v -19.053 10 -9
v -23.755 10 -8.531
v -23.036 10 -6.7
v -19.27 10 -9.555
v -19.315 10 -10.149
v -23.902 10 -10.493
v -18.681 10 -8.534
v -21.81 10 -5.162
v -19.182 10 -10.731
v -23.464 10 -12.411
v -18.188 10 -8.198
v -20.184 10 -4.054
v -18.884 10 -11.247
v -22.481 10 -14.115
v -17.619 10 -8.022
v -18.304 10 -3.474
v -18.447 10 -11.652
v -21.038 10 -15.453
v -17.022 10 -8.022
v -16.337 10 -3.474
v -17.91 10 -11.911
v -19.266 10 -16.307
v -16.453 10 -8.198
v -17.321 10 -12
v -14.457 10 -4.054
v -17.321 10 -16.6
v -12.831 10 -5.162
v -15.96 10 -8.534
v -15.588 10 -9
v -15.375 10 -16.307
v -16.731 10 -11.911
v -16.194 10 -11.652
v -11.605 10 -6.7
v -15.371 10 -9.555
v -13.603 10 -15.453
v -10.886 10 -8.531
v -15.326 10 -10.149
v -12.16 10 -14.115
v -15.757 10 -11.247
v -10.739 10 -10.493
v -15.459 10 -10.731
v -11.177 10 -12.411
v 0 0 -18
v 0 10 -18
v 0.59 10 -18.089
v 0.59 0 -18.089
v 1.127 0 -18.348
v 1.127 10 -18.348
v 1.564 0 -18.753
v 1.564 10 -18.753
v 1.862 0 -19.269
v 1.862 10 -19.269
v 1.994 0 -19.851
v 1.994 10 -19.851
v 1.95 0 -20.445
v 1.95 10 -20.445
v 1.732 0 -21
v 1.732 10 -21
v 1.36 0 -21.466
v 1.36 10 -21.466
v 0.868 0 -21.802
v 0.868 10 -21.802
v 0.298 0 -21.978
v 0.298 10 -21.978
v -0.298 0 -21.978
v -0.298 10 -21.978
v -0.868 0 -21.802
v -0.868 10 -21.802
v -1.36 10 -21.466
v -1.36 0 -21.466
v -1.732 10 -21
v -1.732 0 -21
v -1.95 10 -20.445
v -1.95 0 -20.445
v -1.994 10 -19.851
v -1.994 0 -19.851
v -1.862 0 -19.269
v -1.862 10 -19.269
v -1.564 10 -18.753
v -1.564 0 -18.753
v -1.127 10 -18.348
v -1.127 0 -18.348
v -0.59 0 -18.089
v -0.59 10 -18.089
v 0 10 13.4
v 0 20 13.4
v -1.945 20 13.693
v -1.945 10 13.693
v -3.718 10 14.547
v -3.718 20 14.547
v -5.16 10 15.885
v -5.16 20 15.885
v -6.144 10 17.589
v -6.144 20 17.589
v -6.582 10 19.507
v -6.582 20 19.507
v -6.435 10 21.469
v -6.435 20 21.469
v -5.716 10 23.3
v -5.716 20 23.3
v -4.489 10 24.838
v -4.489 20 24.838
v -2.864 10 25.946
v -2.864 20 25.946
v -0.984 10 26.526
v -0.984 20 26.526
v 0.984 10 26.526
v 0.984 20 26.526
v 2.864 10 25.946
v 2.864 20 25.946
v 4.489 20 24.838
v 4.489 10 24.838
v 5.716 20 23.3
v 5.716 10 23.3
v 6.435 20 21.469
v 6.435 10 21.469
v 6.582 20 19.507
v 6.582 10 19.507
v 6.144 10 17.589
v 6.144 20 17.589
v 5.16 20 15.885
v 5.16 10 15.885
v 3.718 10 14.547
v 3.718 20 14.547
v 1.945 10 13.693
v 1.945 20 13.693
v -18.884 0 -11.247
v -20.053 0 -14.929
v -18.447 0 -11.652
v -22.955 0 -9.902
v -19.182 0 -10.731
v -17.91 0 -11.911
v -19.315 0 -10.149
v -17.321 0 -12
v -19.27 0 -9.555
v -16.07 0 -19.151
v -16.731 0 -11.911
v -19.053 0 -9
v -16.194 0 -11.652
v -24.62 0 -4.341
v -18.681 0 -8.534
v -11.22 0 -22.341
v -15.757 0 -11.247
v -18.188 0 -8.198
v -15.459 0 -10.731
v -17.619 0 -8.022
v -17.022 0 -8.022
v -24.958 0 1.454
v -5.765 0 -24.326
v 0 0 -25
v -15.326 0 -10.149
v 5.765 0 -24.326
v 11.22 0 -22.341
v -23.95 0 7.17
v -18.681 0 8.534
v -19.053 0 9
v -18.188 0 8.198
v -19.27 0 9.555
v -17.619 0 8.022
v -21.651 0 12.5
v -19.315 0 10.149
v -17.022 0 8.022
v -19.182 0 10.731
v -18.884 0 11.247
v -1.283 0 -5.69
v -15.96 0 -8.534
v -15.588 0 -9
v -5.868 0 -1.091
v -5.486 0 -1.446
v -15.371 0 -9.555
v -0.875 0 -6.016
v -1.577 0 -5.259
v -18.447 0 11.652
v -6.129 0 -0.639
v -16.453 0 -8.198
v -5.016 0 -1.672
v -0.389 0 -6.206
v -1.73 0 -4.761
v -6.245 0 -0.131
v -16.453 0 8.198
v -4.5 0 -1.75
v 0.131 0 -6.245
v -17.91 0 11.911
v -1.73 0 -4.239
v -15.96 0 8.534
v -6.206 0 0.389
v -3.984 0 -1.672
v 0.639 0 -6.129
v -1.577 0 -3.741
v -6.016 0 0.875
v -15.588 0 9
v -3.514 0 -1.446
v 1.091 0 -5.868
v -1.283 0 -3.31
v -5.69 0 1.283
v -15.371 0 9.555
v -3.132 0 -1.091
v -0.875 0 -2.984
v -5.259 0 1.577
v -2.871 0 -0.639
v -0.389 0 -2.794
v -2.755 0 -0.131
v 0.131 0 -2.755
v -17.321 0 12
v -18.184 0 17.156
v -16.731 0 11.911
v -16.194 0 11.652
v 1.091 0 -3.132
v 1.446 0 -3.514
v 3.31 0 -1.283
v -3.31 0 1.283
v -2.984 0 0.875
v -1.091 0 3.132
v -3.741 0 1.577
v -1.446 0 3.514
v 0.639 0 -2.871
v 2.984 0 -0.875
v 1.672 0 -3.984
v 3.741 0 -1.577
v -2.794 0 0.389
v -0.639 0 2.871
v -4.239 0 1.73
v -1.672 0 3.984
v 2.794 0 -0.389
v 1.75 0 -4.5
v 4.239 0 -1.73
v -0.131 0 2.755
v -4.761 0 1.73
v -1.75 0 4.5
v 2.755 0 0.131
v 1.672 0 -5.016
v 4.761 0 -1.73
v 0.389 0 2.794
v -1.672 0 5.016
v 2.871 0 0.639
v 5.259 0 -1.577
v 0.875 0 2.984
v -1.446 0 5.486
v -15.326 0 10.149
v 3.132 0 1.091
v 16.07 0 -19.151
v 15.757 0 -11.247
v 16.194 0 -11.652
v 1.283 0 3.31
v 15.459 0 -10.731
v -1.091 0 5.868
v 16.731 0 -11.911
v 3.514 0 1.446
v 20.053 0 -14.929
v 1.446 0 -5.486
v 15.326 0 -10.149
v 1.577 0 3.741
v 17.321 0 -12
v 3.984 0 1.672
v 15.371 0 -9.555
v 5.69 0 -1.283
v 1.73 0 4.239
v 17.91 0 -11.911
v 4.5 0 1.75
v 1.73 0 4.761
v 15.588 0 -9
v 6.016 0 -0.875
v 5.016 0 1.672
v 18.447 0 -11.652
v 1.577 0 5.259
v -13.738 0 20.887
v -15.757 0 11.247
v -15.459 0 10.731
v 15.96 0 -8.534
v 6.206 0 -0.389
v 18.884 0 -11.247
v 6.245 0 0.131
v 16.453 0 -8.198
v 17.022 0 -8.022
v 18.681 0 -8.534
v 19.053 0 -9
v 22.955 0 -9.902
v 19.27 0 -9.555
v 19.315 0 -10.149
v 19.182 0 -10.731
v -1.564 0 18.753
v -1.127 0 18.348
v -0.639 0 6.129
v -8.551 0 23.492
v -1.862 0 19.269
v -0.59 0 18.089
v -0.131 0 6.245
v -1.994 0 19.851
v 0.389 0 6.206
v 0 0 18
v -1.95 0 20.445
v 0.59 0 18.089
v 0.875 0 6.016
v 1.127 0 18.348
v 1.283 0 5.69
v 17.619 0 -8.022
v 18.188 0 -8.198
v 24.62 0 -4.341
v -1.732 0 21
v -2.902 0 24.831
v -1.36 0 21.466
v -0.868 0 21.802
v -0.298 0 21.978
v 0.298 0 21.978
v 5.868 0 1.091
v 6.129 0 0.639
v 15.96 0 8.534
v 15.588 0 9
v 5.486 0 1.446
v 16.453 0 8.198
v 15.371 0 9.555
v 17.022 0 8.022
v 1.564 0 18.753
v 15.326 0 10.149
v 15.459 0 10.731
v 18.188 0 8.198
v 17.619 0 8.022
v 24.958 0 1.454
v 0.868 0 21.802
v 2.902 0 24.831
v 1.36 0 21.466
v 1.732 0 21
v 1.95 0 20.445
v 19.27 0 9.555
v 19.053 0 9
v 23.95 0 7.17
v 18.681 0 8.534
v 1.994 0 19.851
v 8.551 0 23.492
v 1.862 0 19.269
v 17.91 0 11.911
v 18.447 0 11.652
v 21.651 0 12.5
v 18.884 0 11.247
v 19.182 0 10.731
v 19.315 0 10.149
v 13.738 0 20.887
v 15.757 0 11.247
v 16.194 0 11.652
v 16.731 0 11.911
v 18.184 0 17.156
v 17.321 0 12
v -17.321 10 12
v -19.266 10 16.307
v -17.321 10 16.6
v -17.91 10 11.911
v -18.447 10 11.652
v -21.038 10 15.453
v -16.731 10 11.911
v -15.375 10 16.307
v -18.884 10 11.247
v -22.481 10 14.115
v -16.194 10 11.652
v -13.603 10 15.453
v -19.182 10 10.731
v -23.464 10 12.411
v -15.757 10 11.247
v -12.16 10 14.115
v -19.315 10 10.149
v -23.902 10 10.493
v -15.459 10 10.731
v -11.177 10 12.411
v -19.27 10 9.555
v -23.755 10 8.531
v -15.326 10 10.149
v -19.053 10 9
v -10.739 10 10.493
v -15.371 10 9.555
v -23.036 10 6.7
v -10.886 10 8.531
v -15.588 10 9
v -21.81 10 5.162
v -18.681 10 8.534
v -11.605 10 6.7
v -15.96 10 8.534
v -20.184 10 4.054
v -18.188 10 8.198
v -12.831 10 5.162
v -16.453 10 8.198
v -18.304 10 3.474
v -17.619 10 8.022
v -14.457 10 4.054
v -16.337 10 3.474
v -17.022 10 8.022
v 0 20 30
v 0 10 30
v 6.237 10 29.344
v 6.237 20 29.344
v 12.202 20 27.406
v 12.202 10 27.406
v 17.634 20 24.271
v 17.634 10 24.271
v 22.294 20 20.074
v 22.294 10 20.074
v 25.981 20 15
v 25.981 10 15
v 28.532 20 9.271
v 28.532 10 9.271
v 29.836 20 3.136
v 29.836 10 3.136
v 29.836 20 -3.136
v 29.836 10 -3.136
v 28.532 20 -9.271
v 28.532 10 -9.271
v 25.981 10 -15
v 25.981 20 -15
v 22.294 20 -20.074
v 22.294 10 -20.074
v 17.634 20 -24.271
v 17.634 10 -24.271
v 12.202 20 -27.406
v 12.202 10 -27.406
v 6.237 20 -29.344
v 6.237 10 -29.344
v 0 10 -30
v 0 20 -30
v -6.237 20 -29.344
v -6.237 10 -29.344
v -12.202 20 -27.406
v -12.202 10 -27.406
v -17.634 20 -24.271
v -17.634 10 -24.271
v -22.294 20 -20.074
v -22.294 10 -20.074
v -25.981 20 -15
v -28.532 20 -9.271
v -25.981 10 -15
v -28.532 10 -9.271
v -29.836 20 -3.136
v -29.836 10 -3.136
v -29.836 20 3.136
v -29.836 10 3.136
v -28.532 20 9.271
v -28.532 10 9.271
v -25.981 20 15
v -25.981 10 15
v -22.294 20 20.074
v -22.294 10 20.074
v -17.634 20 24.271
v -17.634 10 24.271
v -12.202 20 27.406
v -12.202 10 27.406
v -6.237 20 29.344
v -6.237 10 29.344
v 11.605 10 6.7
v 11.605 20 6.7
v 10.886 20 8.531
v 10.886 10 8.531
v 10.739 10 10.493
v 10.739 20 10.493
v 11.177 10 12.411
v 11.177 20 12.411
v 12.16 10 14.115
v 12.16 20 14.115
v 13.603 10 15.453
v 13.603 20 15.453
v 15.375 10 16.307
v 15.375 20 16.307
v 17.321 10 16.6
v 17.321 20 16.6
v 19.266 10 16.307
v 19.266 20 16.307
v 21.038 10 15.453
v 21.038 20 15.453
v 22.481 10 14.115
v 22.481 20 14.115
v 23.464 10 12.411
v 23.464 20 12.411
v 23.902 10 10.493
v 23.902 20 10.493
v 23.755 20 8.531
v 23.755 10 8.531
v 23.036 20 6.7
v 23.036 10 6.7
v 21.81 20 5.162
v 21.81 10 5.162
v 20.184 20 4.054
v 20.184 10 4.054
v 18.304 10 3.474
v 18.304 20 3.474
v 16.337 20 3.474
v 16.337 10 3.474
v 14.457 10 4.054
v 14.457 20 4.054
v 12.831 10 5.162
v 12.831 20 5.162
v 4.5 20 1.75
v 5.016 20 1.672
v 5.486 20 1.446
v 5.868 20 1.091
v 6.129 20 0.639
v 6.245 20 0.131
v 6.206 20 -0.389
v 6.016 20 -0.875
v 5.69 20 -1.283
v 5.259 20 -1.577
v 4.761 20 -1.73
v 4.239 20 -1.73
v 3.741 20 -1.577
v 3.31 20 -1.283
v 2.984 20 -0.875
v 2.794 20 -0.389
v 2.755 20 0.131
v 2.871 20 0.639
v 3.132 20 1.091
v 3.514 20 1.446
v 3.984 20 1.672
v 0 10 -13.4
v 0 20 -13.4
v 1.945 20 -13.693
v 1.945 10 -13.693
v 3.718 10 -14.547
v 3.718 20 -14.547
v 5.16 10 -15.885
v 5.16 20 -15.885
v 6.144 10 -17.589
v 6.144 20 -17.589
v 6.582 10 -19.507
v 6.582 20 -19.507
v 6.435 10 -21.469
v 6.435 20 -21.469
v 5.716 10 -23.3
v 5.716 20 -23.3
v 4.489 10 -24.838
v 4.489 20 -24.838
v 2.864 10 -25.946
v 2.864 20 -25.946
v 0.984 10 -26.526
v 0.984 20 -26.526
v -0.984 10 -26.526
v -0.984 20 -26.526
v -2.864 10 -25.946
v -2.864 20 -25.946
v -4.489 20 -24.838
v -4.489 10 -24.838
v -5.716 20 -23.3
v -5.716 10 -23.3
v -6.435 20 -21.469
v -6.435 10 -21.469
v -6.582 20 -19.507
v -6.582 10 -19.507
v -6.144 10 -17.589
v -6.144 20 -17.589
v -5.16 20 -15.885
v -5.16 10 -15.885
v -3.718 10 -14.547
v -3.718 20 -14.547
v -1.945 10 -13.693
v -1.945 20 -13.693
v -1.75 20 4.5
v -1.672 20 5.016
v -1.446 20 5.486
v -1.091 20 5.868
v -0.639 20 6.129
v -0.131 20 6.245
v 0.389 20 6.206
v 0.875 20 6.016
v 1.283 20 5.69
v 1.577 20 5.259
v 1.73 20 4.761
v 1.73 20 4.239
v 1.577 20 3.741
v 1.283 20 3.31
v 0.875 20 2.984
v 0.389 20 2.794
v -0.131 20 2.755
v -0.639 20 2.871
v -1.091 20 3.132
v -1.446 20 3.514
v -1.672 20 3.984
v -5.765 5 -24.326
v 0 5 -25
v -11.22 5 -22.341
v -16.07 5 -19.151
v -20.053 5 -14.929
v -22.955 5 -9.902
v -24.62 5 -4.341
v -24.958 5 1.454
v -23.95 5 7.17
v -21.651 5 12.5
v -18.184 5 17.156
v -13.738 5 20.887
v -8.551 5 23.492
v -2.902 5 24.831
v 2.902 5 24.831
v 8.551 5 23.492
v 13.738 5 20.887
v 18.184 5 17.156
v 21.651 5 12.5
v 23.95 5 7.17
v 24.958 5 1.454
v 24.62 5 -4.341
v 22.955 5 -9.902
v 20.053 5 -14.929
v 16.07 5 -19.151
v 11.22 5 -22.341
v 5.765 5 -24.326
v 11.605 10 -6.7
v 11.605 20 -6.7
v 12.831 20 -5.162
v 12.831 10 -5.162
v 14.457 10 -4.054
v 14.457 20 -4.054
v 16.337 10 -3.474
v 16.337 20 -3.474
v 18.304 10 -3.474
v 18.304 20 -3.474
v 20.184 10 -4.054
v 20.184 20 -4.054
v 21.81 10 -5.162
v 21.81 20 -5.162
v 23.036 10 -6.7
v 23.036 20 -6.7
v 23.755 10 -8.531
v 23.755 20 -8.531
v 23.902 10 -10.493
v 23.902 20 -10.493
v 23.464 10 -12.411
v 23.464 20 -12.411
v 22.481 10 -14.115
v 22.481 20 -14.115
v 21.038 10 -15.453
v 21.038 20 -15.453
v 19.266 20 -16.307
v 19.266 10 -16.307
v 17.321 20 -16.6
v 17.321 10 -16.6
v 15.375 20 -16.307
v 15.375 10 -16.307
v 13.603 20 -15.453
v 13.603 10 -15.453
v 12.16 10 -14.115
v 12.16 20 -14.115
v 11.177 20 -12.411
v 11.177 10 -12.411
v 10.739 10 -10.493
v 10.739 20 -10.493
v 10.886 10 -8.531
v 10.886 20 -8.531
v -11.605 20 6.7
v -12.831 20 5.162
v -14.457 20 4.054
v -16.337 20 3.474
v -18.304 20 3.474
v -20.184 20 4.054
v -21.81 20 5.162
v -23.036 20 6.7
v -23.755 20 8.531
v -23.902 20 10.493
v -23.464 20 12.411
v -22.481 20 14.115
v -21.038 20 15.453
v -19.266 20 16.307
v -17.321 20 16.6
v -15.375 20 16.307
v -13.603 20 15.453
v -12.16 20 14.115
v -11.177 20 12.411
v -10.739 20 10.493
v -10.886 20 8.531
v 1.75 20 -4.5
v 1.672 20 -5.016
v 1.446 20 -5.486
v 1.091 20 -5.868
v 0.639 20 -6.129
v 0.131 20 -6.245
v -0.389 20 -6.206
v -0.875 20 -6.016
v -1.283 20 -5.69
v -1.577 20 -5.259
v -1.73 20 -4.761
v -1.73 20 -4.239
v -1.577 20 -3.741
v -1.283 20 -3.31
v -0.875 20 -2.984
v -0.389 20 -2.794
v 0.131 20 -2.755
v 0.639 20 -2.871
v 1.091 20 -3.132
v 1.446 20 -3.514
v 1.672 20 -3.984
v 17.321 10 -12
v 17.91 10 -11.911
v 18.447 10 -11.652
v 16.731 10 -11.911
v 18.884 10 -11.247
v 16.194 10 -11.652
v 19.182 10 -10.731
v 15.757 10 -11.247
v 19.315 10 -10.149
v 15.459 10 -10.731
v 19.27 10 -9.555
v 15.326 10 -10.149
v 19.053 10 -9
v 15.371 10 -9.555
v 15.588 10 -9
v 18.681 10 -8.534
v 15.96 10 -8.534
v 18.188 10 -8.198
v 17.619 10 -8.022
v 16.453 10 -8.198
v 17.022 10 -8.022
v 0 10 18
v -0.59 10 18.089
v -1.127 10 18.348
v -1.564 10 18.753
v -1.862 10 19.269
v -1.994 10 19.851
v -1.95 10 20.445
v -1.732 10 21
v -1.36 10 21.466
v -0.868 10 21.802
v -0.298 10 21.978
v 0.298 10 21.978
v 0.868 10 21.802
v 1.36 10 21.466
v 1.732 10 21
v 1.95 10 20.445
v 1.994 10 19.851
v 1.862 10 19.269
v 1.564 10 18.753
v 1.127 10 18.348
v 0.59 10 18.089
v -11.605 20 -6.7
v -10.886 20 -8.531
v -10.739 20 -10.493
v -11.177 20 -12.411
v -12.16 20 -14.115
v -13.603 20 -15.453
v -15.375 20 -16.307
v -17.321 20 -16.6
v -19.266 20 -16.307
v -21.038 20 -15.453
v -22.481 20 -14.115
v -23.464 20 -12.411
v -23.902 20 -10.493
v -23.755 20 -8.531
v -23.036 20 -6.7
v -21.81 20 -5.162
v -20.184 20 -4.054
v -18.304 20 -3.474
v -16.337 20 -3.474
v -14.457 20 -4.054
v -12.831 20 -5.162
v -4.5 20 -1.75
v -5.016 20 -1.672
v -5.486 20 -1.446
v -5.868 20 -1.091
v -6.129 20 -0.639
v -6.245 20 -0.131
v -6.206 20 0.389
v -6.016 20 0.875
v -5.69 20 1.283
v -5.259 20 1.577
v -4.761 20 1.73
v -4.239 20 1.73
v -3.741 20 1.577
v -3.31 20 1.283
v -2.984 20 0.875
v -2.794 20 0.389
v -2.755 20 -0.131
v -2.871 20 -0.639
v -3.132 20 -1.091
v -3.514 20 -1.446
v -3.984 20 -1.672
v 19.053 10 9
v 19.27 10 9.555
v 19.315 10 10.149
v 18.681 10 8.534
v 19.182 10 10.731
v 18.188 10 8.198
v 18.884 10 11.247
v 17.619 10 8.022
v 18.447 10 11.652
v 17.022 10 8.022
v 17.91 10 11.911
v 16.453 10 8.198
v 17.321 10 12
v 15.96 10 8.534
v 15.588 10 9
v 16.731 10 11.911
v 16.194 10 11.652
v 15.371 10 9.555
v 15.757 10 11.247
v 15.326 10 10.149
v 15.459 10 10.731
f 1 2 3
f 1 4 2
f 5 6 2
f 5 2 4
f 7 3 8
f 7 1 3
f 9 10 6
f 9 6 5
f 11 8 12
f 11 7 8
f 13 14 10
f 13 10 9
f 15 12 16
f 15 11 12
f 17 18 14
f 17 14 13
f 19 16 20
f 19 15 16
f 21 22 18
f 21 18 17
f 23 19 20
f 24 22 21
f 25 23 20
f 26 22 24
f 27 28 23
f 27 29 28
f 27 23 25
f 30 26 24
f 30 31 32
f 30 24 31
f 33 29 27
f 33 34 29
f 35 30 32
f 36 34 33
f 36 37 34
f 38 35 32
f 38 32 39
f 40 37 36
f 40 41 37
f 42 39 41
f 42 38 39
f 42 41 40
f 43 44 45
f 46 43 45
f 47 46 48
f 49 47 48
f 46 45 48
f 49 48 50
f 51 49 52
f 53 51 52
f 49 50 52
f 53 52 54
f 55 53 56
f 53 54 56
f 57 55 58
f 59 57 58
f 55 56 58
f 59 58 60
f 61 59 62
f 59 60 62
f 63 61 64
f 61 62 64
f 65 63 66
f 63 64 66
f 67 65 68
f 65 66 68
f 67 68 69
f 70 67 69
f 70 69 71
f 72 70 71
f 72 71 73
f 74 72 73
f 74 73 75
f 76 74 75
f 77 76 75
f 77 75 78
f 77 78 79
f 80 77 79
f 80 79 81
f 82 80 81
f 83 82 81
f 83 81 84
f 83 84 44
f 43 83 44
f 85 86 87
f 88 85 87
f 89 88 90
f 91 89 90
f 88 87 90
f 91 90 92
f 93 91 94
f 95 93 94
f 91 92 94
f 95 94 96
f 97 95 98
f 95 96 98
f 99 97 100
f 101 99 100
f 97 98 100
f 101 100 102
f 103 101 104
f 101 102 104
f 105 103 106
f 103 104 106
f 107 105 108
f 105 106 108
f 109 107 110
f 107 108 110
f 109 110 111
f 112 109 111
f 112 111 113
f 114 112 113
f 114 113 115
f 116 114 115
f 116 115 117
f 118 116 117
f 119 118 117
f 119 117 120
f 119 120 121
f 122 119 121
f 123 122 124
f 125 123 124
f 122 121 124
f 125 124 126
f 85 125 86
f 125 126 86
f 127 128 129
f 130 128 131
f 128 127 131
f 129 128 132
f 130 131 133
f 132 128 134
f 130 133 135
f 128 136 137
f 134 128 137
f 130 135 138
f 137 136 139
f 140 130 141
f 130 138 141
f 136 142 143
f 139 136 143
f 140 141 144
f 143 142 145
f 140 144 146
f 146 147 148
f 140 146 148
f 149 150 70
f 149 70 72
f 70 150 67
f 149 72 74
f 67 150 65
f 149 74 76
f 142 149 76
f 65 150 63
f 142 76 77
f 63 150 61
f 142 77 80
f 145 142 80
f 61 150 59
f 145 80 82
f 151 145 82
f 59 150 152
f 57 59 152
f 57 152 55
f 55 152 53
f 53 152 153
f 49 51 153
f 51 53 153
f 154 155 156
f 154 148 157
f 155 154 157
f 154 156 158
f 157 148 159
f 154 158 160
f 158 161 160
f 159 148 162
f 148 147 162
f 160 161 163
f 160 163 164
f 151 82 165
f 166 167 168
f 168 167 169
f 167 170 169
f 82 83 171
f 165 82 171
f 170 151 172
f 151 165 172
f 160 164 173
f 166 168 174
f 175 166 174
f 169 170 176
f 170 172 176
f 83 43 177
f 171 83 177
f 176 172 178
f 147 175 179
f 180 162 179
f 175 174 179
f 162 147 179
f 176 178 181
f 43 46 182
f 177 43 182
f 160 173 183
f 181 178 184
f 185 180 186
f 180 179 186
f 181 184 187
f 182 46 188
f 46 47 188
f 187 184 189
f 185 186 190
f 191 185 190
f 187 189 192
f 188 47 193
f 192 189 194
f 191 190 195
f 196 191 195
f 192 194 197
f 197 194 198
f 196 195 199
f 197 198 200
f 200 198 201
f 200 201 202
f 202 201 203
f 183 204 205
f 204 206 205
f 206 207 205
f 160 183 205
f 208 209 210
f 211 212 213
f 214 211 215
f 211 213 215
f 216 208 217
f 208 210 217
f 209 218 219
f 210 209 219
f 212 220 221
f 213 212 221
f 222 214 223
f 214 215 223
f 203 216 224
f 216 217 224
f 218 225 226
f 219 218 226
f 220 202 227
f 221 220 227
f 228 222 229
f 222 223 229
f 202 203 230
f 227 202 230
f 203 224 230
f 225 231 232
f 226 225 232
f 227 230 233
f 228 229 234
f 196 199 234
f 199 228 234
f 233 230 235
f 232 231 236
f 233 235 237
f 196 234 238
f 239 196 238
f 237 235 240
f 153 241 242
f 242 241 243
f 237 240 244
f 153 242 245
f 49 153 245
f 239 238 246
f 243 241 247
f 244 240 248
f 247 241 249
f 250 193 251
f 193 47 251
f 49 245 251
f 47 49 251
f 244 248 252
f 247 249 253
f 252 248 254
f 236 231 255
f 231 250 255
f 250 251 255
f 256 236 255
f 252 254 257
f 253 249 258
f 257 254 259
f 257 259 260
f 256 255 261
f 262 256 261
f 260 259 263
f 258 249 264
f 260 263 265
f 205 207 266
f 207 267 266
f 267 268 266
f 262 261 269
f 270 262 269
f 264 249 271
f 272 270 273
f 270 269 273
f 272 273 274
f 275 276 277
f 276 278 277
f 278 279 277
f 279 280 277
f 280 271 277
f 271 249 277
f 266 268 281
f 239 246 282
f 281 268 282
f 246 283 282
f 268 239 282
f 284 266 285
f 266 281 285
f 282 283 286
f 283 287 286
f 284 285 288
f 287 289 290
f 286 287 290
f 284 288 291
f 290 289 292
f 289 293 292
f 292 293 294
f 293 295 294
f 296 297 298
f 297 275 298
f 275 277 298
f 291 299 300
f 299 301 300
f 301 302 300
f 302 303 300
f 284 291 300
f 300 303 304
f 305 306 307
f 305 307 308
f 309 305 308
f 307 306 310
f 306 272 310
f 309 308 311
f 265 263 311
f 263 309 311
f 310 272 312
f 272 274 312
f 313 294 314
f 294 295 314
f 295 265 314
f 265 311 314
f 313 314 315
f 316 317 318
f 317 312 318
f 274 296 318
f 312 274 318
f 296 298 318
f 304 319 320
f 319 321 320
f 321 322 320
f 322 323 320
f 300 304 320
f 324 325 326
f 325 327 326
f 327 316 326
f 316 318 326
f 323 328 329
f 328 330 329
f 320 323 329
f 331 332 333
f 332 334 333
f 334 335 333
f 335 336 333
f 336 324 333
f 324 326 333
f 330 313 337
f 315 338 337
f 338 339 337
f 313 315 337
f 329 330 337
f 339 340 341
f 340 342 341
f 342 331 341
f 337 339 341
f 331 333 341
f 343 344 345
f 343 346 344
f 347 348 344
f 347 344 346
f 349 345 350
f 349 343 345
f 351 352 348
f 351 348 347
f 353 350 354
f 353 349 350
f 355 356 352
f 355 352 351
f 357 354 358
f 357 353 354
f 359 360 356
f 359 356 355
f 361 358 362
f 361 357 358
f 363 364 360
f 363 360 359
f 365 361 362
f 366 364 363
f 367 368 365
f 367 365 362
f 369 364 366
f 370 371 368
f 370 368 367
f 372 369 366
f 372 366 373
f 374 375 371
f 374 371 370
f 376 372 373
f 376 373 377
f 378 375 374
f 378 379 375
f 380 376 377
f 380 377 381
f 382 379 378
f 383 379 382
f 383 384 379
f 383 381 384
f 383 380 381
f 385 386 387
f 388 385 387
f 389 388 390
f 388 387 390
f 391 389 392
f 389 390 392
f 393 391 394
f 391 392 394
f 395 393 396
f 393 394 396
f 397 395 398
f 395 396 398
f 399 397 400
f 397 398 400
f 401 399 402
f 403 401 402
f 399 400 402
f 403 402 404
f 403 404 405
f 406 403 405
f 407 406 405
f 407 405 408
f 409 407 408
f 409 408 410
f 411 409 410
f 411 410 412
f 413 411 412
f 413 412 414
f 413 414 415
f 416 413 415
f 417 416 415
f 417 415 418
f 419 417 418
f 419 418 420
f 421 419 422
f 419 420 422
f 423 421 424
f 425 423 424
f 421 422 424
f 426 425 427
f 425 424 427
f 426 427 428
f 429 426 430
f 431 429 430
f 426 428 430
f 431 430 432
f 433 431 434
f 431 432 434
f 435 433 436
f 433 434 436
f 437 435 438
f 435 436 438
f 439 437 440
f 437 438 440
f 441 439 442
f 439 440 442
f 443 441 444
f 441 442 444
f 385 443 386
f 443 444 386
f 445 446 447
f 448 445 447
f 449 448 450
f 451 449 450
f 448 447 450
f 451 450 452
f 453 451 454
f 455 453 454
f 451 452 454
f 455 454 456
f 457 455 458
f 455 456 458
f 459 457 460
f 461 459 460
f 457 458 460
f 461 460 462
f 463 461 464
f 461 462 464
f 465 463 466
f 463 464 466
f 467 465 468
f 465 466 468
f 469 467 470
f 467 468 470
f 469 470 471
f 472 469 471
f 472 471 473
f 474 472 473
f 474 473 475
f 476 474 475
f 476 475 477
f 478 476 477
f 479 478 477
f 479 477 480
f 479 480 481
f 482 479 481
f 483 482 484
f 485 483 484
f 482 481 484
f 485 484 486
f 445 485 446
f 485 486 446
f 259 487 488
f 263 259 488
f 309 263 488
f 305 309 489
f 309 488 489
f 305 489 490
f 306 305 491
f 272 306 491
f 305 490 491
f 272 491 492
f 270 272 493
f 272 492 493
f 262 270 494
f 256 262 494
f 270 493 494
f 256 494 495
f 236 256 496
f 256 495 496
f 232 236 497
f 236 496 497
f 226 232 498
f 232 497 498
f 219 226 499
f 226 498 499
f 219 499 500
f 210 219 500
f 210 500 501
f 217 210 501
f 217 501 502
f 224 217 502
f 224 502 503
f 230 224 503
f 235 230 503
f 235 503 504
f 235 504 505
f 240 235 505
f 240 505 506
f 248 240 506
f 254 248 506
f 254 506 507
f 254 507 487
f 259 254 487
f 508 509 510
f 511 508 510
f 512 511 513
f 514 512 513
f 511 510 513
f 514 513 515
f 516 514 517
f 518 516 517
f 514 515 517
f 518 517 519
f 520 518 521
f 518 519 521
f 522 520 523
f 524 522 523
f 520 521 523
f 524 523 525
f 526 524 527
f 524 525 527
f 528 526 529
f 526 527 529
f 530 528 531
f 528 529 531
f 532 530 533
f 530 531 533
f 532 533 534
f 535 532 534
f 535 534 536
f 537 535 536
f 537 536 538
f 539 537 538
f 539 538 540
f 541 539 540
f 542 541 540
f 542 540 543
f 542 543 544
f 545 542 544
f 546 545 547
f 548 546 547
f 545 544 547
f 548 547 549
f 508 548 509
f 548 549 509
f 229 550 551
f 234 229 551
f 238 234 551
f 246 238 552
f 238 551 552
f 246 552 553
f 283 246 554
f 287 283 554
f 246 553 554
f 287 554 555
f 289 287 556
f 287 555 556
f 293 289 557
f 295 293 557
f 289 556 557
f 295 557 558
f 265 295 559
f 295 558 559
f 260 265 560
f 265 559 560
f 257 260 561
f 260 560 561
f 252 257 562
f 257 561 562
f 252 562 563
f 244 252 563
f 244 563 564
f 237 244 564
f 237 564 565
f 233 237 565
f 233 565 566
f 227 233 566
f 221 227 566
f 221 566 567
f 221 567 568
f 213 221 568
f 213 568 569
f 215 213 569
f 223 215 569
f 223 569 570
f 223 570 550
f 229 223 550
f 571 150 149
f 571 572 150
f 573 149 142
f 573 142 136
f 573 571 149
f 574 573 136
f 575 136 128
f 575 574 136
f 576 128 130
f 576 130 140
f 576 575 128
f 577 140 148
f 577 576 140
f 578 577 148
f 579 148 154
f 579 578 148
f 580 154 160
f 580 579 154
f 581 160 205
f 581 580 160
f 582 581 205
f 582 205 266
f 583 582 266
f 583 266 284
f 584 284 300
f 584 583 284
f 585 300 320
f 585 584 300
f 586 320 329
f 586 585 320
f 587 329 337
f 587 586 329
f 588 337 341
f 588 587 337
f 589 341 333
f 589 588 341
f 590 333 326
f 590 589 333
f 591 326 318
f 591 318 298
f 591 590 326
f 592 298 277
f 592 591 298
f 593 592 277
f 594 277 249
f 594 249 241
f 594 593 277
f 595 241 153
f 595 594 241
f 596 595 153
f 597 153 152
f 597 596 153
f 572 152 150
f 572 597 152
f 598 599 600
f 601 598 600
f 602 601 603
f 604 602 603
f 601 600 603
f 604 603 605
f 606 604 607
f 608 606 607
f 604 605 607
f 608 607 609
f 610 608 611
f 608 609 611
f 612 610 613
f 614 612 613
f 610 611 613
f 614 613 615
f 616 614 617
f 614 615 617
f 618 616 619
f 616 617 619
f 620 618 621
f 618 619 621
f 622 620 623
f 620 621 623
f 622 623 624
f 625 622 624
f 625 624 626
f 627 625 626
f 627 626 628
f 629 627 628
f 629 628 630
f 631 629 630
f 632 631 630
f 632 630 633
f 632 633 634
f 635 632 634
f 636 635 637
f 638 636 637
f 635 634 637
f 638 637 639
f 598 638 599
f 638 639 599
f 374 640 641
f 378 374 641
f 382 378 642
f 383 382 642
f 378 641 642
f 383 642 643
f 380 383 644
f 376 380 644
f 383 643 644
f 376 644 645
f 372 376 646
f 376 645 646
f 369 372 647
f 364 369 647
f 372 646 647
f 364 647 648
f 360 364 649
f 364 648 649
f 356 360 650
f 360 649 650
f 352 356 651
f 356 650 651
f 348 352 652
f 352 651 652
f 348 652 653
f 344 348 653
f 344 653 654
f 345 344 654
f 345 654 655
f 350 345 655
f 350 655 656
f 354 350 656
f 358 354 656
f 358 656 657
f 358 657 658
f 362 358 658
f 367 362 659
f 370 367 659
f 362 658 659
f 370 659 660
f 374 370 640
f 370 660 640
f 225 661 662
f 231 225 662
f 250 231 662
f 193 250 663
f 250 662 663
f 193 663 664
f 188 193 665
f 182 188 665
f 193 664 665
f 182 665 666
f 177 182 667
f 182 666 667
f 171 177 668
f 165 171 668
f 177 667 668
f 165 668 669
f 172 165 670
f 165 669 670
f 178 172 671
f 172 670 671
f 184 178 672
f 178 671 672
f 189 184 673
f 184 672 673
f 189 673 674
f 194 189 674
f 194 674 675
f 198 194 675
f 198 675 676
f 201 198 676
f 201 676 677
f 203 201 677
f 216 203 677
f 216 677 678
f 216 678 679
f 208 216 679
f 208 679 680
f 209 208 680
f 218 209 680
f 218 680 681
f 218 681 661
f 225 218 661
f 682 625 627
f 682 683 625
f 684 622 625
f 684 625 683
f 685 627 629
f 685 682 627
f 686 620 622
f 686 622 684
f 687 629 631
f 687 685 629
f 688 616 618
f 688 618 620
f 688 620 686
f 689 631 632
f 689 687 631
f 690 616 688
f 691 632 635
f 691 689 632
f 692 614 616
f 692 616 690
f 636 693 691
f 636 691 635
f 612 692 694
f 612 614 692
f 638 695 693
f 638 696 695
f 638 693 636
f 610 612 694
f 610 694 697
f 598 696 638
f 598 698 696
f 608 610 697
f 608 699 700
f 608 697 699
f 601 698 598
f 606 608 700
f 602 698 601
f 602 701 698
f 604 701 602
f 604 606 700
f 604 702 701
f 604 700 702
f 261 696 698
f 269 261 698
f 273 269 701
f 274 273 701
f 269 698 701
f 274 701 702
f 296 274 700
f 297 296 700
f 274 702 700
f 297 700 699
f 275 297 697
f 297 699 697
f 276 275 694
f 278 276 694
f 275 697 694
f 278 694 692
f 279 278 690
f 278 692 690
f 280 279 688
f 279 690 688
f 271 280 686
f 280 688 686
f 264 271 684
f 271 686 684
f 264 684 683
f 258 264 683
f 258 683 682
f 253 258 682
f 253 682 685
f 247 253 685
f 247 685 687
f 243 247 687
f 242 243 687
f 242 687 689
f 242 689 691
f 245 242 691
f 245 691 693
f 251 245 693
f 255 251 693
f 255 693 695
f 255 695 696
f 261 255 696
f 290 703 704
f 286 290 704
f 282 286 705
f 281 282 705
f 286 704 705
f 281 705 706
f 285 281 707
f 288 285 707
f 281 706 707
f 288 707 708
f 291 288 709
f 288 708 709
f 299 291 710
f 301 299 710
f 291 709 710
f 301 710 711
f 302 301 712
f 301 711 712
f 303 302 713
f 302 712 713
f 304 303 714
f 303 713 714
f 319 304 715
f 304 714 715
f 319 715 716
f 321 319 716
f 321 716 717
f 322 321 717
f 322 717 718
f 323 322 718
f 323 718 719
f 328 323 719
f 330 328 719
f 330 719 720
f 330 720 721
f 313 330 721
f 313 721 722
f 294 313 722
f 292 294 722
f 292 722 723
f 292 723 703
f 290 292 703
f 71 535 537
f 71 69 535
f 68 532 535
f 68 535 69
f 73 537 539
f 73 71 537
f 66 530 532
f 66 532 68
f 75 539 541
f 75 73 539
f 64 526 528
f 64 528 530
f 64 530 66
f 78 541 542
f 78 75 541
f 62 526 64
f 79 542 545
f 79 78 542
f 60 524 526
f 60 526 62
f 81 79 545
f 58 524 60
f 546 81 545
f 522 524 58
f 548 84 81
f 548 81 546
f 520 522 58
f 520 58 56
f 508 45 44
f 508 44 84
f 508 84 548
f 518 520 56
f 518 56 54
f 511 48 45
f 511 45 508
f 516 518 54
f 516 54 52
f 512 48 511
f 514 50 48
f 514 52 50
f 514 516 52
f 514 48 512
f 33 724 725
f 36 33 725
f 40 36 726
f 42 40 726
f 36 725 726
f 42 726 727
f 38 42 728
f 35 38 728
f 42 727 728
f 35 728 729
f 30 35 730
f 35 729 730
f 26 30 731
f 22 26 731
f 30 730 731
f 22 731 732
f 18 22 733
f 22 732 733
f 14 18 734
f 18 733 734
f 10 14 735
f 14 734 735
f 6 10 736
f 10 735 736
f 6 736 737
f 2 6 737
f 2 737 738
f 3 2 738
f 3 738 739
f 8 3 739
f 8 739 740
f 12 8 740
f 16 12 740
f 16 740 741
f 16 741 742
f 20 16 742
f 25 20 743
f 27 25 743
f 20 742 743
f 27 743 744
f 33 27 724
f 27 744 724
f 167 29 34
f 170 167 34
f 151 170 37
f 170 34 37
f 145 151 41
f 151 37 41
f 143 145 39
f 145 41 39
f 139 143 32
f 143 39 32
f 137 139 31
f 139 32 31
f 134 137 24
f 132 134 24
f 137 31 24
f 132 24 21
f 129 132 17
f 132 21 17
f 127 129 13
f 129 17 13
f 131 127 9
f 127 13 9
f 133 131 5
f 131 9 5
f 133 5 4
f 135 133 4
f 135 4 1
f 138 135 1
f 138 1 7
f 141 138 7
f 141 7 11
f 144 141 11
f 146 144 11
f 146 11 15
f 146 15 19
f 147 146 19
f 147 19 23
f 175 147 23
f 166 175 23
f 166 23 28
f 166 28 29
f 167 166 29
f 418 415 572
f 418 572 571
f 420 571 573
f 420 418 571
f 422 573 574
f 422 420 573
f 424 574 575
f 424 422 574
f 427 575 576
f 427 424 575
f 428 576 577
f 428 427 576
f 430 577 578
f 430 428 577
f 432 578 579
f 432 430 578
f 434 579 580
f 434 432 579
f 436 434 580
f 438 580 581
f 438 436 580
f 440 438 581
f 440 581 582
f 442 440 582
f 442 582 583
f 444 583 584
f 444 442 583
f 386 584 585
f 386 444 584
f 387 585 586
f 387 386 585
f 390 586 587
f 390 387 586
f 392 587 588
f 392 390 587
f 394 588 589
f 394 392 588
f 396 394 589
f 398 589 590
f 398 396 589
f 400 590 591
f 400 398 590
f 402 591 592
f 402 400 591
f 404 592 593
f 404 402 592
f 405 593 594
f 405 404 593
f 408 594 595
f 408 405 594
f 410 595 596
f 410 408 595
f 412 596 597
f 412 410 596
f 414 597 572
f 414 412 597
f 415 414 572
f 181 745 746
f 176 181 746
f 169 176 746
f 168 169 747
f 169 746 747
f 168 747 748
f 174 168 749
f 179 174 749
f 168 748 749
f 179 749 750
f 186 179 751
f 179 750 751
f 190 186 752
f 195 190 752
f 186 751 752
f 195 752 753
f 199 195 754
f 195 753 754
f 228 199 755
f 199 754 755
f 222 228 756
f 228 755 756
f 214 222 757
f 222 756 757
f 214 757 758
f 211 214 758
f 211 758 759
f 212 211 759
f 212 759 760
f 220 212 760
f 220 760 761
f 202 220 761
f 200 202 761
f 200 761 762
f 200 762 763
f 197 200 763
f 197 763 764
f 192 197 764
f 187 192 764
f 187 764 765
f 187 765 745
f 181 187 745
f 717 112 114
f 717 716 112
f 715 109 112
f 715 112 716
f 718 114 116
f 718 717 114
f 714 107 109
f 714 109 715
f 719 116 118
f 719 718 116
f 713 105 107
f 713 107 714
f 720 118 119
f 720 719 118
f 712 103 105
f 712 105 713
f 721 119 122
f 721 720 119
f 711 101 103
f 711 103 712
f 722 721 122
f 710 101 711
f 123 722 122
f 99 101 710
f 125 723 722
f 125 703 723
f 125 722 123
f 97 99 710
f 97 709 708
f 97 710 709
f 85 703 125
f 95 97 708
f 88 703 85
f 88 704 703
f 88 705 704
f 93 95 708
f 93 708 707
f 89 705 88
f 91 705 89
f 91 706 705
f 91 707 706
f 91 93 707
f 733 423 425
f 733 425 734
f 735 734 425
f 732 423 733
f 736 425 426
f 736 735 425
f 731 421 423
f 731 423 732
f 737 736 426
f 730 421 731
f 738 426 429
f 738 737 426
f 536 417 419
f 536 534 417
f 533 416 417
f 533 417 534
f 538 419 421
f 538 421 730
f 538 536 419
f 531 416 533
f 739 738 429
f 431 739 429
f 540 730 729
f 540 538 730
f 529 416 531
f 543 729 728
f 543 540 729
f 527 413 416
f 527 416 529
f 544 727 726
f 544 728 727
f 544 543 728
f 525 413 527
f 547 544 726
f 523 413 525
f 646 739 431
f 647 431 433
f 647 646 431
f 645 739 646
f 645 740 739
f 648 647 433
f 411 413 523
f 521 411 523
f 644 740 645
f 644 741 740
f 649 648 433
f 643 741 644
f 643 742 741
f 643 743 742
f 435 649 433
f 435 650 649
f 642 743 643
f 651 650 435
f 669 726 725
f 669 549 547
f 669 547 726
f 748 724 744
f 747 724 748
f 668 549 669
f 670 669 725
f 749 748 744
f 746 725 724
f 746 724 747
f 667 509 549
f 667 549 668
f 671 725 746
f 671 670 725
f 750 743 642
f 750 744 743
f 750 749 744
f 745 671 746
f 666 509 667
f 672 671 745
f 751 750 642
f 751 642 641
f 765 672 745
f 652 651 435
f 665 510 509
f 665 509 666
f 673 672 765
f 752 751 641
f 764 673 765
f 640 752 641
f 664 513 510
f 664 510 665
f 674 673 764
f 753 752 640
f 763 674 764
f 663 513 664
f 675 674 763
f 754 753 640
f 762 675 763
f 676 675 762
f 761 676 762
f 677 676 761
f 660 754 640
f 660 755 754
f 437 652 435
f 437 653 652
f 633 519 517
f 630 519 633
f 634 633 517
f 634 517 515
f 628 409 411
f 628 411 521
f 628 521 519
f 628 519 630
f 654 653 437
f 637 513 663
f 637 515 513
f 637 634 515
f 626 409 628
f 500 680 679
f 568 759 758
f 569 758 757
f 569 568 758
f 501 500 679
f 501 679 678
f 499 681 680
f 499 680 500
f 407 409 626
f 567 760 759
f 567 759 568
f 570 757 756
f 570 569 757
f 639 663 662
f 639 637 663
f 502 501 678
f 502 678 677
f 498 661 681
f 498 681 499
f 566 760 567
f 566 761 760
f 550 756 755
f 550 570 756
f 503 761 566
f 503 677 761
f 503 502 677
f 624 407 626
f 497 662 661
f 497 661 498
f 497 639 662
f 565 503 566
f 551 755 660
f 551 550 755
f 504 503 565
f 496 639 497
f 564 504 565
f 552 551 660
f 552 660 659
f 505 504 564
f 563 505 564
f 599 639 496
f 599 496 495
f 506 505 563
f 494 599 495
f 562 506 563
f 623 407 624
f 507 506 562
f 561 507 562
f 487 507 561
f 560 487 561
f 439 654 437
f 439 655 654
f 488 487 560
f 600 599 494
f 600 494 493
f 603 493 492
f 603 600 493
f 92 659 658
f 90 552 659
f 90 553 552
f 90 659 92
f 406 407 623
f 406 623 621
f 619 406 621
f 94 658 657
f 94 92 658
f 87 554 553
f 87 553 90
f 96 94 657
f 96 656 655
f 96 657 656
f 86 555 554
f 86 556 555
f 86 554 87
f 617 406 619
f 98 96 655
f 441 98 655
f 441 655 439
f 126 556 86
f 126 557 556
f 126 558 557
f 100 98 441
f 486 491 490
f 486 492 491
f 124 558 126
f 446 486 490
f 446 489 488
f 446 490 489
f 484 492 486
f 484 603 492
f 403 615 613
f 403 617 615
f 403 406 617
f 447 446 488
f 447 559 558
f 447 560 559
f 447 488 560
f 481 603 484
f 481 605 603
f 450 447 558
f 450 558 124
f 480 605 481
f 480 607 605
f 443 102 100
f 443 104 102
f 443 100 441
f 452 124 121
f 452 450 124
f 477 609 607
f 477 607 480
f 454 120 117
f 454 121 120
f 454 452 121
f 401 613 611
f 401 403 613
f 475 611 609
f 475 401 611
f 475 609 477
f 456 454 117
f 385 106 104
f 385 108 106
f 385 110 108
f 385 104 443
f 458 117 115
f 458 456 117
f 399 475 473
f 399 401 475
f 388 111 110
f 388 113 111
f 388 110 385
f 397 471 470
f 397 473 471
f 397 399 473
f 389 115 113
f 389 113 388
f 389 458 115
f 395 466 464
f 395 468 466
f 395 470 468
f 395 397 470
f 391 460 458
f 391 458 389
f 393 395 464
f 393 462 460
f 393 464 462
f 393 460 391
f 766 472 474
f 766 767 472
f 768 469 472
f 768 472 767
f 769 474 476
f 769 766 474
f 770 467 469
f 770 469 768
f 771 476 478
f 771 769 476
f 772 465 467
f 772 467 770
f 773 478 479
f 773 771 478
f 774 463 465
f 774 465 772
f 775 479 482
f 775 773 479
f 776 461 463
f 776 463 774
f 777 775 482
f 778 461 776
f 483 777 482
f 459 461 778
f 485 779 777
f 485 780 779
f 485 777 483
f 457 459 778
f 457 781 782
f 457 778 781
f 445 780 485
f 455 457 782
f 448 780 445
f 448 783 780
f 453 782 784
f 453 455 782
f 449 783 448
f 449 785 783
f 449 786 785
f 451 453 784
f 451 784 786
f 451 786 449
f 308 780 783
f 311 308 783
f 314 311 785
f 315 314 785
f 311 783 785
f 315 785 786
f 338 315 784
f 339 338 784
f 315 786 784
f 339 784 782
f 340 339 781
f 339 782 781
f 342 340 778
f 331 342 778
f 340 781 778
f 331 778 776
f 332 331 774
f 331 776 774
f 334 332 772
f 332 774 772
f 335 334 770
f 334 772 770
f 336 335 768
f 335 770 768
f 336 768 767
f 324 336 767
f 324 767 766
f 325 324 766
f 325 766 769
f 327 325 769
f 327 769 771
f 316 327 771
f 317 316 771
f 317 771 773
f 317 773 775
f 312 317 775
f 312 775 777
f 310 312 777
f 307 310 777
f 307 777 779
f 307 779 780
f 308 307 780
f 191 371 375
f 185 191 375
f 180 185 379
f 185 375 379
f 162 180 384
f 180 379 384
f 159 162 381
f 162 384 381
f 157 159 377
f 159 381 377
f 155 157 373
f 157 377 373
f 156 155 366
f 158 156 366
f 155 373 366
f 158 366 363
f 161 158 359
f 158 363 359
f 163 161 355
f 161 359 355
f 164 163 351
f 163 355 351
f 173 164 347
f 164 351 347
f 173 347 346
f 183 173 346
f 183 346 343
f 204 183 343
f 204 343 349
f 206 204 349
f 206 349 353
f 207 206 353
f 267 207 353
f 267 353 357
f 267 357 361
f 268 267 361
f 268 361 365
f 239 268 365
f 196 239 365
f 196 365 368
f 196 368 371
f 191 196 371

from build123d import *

# Parameters (mm, degrees)
SKETCH1_R           = 30
BOSS_EXTRUDE1_DEPTH = 20
SKETCH2_R           = 6.6
CUT_EXTRUDE1_DEPTH  = 10
SKETCH3_R           = 2
CUT_EXTRUDE2_DEPTH  = 35
CIRPATTERN1_COUNT   = 6
SKETCH6_R           = 1.75
CUT_EXTRUDE4_DEPTH  = 45
CIRPATTERN3_COUNT   = 4


with BuildPart() as part:
    # Sketch1 → Boss-Extrude1 (new body)
    with BuildSketch(Plane(origin=(0, 0, 0), x_dir=(1, 0, 0), z_dir=(0, 1, 0))):
        with Locations(Location((0, 0, 0), (0, 0, 270))):
            Circle(SKETCH1_R)
    extrude(amount=BOSS_EXTRUDE1_DEPTH)

    # Sketch2 → Cut-Extrude1 (cut)
    with BuildSketch(Plane(origin=(0, 20, 0), x_dir=(1, 0, 0), z_dir=(0, 1, 0))):
        with Locations(Location((0, 20, 0), (0, 0, 270))):
            Circle(SKETCH2_R)
    cut_extrude1 = extrude(amount=-CUT_EXTRUDE1_DEPTH, mode=Mode.SUBTRACT)

    # Sketch3 → Cut-Extrude2 (cut)
    with BuildSketch(Plane(origin=(0, 10, 0), x_dir=(1, 0, 0), z_dir=(0, 1, 0))):
        with Locations(Location((0, 20, 0), (0, 0, 270))):
            Circle(SKETCH3_R)
    cut_extrude2 = extrude(amount=-CUT_EXTRUDE2_DEPTH, mode=Mode.SUBTRACT)

    # CirPattern1: Cut-Extrude1, Cut-Extrude2 ×6 about axis
    cirpattern1_axis = Axis((0, 0, 0), (0, 1, 0))
    add([cut_extrude1.rotate(cirpattern1_axis, i * 360 / CIRPATTERN1_COUNT) for i in range(1, CIRPATTERN1_COUNT)], mode=Mode.SUBTRACT)
    add([cut_extrude2.rotate(cirpattern1_axis, i * 360 / CIRPATTERN1_COUNT) for i in range(1, CIRPATTERN1_COUNT)], mode=Mode.SUBTRACT)

    # Sketch6 → Cut-Extrude4 (cut)
    with BuildSketch(Plane(origin=(0, 20, 0), x_dir=(1, 0, 0), z_dir=(0, 1, 0))):
        with Locations(Location((4.5, 0, 0), (0, 0, 270))):
            Circle(SKETCH6_R)
    cut_extrude4 = extrude(amount=-CUT_EXTRUDE4_DEPTH, mode=Mode.SUBTRACT)

    # CirPattern3: Cut-Extrude4 ×4 about axis
    cirpattern3_axis = Axis((0, 0, 0), (0, 1, 0))
    for i in range(1, CIRPATTERN3_COUNT):
        add(cut_extrude4.rotate(cirpattern3_axis, i * 360 / CIRPATTERN3_COUNT), mode=Mode.SUBTRACT)

    # Sketch7 → Cut-Revolve1 (revolve, cut)
    with BuildSketch(Plane.XY, mode=Mode.PRIVATE) as cut_revolve1_sk:
        Polygon((-25, 0), (-25, 5), (-30, 10), (-30, 0), align=None)
    revolve(cut_revolve1_sk.sketch.rotate(Axis((0, 0, 0), (0, 1, 0)), 270), axis=Axis((0, 0, 0), (0, 1, 0)), mode=Mode.SUBTRACT)


solid = part.part
